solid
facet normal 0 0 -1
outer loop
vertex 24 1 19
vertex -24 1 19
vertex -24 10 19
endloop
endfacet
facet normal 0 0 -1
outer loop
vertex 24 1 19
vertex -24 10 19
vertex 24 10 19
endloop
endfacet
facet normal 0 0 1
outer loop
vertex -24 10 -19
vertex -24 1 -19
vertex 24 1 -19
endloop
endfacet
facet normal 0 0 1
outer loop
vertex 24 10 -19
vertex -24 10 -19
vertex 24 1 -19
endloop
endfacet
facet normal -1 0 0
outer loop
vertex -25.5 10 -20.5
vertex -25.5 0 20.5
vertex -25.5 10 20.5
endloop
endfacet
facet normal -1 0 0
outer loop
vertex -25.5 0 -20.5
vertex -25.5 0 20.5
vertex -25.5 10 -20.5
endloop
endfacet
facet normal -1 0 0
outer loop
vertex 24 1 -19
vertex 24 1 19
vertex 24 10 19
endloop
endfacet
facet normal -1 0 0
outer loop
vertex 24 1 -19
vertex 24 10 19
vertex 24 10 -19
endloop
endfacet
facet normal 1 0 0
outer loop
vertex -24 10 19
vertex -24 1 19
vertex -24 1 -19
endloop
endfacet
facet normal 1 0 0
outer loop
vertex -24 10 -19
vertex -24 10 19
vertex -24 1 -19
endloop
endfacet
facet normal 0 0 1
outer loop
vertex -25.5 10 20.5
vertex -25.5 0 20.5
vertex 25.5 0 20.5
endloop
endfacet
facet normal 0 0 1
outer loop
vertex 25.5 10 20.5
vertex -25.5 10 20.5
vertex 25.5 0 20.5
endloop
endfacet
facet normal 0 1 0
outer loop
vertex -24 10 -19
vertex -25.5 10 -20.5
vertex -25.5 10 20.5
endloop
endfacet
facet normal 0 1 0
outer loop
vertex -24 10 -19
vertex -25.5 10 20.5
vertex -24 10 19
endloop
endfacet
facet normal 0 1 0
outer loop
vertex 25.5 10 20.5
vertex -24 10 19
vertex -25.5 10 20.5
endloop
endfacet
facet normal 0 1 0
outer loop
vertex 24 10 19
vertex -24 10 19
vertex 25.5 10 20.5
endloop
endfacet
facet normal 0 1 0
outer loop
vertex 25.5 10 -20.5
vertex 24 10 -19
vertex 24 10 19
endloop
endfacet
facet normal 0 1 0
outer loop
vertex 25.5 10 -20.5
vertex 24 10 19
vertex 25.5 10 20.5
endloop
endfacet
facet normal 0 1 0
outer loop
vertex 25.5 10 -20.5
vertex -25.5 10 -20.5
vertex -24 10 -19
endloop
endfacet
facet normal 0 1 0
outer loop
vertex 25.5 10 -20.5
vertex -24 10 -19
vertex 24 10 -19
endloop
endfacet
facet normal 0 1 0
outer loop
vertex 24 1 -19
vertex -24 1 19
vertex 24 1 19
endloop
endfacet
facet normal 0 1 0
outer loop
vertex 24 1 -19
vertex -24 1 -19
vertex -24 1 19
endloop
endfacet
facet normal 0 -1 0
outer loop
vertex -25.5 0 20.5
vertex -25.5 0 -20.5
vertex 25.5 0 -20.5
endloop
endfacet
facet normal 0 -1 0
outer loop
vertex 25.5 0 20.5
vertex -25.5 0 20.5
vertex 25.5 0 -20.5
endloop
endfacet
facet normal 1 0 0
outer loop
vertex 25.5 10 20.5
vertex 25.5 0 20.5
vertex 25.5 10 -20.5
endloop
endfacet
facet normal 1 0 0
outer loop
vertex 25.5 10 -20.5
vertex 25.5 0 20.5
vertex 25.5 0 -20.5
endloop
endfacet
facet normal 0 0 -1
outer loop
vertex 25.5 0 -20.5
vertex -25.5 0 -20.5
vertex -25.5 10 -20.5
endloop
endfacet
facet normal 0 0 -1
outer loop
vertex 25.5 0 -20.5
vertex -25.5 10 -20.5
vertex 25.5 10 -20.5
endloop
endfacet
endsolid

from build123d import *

# Parameters (mm, degrees)
SKETCH1_W           = 51
SKETCH1_H           = 41
SKETCH1_W_2         = 48
SKETCH1_H_2         = 38
BOSS_EXTRUDE1_DEPTH = 1
SKETCH1_3_W         = 51
SKETCH1_3_H         = 41
SKETCH1_3_W_2       = 48
SKETCH1_3_H_2       = 38
BOSS_EXTRUDE2_DEPTH = 10


with BuildPart() as part:
    # Sketch1 → Boss-Extrude1 (new body)
    with BuildSketch(Plane(origin=(0, 0, 0), x_dir=(1, 0, 0), z_dir=(0, 1, 0))):
        Rectangle(SKETCH1_W, SKETCH1_H)
        Rectangle(SKETCH1_W_2, SKETCH1_H_2, mode=Mode.SUBTRACT)
        Rectangle(SKETCH1_W_2, SKETCH1_H_2)
    extrude(amount=BOSS_EXTRUDE1_DEPTH)

    # Sketch1<3> → Boss-Extrude2 (add)
    with BuildSketch(Plane(origin=(0, 0, 0), x_dir=(1, 0, 0), z_dir=(0, 1, 0))):
        Rectangle(SKETCH1_3_W, SKETCH1_3_H)
        Rectangle(SKETCH1_3_W_2, SKETCH1_3_H_2, mode=Mode.SUBTRACT)
    extrude(amount=BOSS_EXTRUDE2_DEPTH)


solid = part.part
